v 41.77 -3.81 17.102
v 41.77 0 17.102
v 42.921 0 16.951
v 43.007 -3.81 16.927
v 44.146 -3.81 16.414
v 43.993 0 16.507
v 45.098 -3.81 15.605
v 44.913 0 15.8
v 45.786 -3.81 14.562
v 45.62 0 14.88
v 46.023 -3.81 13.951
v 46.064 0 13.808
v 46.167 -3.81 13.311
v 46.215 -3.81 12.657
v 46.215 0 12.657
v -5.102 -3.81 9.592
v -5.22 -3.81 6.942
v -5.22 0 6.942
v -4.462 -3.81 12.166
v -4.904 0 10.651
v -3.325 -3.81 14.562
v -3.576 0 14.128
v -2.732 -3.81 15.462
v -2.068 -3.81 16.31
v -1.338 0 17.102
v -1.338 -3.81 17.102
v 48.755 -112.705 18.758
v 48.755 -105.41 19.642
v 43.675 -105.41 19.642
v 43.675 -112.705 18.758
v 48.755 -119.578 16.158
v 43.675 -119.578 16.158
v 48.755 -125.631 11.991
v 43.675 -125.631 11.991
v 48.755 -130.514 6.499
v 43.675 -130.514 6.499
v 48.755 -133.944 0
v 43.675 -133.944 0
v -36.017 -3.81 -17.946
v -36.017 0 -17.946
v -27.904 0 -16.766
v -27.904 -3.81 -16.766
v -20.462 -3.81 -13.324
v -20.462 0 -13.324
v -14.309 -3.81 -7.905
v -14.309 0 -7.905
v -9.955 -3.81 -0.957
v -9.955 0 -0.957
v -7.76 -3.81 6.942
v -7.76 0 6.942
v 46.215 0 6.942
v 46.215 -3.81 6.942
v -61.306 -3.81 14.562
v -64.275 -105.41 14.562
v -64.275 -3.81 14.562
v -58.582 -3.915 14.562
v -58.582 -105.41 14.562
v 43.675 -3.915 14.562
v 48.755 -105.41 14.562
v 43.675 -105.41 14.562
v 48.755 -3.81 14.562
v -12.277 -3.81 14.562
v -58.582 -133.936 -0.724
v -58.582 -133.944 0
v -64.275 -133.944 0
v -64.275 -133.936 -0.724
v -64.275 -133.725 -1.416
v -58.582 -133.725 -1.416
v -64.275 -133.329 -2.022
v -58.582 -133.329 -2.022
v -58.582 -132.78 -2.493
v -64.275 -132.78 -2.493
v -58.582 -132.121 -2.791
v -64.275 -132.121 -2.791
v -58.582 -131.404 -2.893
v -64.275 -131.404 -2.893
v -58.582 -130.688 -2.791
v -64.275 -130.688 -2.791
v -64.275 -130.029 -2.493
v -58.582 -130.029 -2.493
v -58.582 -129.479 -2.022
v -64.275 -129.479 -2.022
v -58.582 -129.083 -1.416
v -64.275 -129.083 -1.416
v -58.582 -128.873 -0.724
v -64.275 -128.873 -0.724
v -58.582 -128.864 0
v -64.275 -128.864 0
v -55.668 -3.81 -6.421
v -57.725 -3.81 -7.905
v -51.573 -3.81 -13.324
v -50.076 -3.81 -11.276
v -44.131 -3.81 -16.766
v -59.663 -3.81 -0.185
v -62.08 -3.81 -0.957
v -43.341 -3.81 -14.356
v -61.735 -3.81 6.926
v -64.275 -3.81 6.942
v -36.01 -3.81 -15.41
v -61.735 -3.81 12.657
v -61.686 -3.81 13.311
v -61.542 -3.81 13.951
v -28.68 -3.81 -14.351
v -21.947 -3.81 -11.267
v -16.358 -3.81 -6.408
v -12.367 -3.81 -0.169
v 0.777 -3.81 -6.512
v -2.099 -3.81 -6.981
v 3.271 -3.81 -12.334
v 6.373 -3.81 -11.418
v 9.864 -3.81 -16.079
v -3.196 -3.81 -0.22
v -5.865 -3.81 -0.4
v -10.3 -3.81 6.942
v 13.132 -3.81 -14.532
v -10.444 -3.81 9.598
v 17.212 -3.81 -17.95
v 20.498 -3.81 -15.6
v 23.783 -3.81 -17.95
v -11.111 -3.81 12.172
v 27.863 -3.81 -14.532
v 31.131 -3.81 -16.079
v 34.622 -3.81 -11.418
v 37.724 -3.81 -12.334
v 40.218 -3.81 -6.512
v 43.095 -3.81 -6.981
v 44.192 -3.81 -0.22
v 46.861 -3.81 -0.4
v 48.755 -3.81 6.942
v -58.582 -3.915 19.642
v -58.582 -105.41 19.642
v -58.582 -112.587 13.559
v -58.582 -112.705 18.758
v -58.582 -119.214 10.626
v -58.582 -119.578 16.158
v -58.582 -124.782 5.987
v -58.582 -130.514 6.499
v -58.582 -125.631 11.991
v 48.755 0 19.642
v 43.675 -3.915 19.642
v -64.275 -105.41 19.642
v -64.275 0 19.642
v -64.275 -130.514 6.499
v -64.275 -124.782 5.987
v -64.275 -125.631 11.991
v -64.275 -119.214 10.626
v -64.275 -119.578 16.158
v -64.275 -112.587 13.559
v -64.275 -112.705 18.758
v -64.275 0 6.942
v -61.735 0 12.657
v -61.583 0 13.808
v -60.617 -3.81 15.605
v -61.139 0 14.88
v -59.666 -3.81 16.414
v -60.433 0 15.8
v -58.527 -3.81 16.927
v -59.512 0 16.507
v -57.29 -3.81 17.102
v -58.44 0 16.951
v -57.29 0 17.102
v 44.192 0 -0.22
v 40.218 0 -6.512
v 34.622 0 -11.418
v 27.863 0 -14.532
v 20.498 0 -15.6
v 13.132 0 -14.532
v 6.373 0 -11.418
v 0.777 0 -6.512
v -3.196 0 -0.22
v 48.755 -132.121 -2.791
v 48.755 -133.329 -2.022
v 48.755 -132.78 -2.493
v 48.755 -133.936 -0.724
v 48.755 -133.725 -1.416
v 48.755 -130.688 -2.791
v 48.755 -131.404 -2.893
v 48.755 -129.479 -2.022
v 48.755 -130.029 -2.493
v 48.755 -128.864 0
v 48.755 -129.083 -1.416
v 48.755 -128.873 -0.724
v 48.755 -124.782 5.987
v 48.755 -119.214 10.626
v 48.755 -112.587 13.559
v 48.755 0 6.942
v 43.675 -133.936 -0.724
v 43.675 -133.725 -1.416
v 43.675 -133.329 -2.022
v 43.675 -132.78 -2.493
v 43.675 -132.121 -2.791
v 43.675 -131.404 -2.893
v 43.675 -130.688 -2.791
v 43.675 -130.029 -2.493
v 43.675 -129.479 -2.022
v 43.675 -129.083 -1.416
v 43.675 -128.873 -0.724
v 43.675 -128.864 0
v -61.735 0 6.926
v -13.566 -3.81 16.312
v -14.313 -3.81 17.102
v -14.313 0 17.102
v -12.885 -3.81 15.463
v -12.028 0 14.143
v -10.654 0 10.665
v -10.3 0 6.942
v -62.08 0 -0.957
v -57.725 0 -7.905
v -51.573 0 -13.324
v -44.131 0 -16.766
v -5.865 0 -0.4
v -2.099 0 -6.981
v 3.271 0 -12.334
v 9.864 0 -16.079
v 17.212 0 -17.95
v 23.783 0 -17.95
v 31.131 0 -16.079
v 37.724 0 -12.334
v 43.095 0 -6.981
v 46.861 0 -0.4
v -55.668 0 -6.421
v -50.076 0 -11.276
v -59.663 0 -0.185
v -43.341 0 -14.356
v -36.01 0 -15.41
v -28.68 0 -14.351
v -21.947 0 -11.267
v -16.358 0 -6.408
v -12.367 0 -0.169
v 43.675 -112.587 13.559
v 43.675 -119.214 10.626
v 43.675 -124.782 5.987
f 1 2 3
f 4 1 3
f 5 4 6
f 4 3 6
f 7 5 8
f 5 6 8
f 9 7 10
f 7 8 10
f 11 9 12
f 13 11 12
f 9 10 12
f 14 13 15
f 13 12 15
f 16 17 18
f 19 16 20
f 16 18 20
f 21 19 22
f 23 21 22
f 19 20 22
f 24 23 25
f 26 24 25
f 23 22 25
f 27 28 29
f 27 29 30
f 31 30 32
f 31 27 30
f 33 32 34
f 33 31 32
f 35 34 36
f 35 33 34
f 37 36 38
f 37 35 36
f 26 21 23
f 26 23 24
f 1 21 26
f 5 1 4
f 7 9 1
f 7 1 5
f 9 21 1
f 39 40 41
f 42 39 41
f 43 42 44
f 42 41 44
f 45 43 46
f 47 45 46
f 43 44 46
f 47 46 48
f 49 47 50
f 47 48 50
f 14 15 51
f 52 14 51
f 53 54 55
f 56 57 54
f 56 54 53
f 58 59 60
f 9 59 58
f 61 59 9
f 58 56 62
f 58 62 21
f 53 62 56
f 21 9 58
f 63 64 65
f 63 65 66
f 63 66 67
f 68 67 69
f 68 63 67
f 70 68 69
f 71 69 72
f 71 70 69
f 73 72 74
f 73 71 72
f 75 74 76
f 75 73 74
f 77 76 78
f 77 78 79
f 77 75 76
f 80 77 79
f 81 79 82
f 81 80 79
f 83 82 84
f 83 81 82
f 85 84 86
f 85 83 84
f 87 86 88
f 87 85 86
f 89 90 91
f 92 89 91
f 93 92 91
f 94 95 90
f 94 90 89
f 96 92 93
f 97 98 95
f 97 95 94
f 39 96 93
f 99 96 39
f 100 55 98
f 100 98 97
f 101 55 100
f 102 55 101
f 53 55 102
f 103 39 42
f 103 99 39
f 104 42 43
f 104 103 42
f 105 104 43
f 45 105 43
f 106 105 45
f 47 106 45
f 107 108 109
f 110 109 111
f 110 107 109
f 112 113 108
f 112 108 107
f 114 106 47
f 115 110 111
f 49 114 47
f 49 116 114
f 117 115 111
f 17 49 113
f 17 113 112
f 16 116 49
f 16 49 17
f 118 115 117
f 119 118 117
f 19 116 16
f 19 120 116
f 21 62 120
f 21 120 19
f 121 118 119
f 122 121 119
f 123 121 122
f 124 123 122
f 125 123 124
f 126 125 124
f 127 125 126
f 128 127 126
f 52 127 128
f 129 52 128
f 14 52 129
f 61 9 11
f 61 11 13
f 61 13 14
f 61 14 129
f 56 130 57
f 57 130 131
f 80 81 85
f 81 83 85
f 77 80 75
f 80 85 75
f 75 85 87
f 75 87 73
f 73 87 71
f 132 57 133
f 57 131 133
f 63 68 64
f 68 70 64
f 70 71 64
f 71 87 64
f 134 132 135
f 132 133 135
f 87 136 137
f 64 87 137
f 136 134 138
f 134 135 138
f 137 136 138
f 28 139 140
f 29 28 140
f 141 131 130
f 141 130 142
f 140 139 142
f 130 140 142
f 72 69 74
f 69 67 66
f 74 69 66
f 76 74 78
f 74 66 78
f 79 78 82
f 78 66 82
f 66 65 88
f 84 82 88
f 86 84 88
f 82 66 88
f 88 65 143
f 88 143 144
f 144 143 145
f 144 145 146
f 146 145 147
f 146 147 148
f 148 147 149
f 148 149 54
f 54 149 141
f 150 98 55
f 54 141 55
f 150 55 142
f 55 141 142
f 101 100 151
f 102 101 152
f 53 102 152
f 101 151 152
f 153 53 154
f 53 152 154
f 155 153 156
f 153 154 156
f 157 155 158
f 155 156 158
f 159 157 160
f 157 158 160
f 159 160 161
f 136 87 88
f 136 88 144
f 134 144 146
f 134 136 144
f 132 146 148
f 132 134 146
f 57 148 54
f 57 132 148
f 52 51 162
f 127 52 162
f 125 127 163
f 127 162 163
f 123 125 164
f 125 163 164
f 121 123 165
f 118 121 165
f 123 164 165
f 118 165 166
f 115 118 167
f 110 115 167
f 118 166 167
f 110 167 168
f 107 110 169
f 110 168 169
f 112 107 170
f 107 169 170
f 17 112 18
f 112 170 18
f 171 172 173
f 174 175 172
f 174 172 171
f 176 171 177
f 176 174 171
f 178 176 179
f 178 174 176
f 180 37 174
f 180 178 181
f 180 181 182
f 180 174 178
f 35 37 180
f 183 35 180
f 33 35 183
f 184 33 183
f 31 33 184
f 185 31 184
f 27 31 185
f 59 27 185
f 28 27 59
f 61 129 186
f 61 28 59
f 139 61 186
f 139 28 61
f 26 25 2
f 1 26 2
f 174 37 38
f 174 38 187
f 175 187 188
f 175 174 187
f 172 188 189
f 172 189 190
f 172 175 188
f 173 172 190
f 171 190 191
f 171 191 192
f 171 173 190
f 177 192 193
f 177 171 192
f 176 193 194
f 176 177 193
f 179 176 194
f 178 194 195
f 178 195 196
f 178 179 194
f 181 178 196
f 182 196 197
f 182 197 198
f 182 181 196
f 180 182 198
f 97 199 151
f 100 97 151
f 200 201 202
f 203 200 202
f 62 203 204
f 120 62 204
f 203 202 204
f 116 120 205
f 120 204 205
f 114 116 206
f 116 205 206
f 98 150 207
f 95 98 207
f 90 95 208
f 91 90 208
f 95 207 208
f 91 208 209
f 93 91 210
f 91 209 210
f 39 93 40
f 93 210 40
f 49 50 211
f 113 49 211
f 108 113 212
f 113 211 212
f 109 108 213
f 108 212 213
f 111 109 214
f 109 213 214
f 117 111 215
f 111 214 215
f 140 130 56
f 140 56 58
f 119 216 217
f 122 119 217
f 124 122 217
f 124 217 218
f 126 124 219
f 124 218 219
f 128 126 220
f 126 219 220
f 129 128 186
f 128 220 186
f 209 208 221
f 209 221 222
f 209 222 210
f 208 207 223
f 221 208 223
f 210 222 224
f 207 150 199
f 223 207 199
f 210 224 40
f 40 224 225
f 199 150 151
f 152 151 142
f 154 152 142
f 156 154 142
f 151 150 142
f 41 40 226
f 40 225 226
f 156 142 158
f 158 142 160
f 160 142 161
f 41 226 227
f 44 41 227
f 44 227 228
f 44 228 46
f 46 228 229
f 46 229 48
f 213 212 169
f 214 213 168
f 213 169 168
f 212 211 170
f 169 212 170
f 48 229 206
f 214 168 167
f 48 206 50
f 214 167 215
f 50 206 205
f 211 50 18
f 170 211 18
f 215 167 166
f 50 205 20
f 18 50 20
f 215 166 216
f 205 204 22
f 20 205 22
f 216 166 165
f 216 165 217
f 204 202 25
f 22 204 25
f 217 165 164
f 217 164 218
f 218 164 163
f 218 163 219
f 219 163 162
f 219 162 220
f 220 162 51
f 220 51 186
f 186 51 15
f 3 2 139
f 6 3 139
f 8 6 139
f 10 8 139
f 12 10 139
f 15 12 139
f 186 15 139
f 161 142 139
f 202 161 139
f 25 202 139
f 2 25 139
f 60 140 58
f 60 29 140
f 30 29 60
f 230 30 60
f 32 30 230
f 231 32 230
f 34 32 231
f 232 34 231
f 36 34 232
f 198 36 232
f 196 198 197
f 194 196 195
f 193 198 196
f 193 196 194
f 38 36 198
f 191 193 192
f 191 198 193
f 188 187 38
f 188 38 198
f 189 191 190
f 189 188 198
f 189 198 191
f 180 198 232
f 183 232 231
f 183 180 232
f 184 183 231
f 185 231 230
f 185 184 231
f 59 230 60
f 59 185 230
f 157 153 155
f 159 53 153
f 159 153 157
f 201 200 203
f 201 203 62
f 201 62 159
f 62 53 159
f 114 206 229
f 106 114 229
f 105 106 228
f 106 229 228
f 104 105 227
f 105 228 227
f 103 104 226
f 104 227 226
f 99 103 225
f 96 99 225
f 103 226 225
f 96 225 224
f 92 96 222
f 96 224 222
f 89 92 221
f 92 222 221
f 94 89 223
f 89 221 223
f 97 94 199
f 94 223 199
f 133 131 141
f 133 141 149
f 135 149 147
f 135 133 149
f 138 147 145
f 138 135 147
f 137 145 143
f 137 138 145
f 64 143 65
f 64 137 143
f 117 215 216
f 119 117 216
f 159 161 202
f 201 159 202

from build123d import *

# Parameters (mm, degrees)
F1_DEPTH = 3.81
F3_DEPTH = 113.03
F4_W     = 102.2572831413
F4_H     = 63.9604873323
F4_H_2   = 99.7172831413
F5_DEPTH = 76.2
F6_DEPTH = 1.778


with BuildPart() as f1:
    # F0 (on Front) → F1 (new body)
    with BuildSketch(Plane.XZ):
        with BuildLine():
            Line((-61.7348178759, 19.6423271978), (-64.2748178759, 19.6423271978))
            Line((-64.2748178759, 19.6423271978), (-64.2748178759, 17.1023271978))
            Line((-64.2748178759, 17.1023271978), (-64.2748178759, 6.9423271978))
            ThreePointArc((-64.2748178759, 6.9423271978), (-54.844956833, -10.8368491458), (-36.0173178759, -17.9460967888))
            ThreePointArc((-36.0173178759, -17.9460967888), (-17.1896789189, -10.8368491458), (-7.7598178759, 6.9423271978))
            ThreePointArc((-7.7598178759, 6.9423271978), (0.406829165, -9.8369400067), (17.212230035, -17.9496728022))
            Line((17.212230035, -17.9496728022), (20.4976821241, -17.9496728022))
            Line((20.4976821241, -17.9496728022), (23.7831342132, -17.9496728022))
            ThreePointArc((23.7831342132, -17.9496728022), (40.5885350832, -9.8369400067), (48.7551821241, 6.9423271978))
            Line((48.7551821241, 6.9423271978), (48.7551821241, 17.1023271978))
            Line((48.7551821241, 17.1023271978), (48.7551821241, 19.6423271978))
            Line((48.7551821241, 19.6423271978), (46.2151821241, 19.6423271978))
            Line((46.2151821241, 19.6423271978), (-61.7348178759, 19.6423271978))
        make_face()
        with BuildLine():
            ThreePointArc((46.2151821241, 6.9423271978), (20.4976821241, -15.5999571068), (-5.2198178759, 6.9423271978))
            ThreePointArc((-5.2198178759, 6.9423271978), (-4.3618373454, 12.4360262368), (-1.3381814351, 17.1023271978))
            Line((-1.3381814351, 17.1023271978), (41.7701821241, 17.1023271978))
            ThreePointArc((41.7701821241, 17.1023271978), (44.9132717665, 15.8004168402), (46.2151821241, 12.6573271978))
            Line((46.2151821241, 12.6573271978), (46.2151821241, 6.9423271978))
        make_face(mode=Mode.SUBTRACT)
        with BuildLine():
            ThreePointArc((-14.3130178759, 17.1023271978), (-11.2183816966, 12.4521014886), (-10.2998178759, 6.9423271978))
            ThreePointArc((-10.2998178759, 6.9423271978), (-36.010114835, -15.409671479), (-61.7348178759, 6.9257458672))
            Line((-61.7348178759, 6.9257458672), (-61.7348178759, 12.6573271978))
            ThreePointArc((-61.7348178759, 12.6573271978), (-60.4329075183, 15.8004168402), (-57.2898178759, 17.1023271978))
            Line((-57.2898178759, 17.1023271978), (-14.3130178759, 17.1023271978))
        make_face(mode=Mode.SUBTRACT)
    extrude(amount=F1_DEPTH)

    # F2 (on face) → F3 (join)
    with BuildSketch(Plane.YZ.offset(48.7551821241)):
        with BuildLine():
            Line((-3.81, 14.5623271978), (-3.81, 19.6423271978))
            Line((-3.81, 19.6423271978), (-105.41, 19.6423271978))
            ThreePointArc((-105.41, 19.6423271978), (-122.7306756991, 14.2570441707), (-133.9442287254, 0))
            ThreePointArc((-133.9442287254, 0), (-131.4042287254, -2.8934895881), (-128.8642287254, 0))
            ThreePointArc((-128.8642287254, 0), (-119.2136428029, 10.6256409156), (-105.41, 14.5623271978))
            Line((-105.41, 14.5623271978), (-3.81, 14.5623271978))
        make_face()
    extrude(amount=-F3_DEPTH)

    # F4 (on face) → F5 (cut)
    with BuildSketch(Plane.XY.offset(19.6423271978)):
        with Locations((-7.4534594466, -137.3902436662)):
            Rectangle(F4_W, F4_H)
        with Locations((-7.4534594466, -55.5513584293)):
            Rectangle(F4_W, F4_H_2)
    extrude(amount=-F5_DEPTH, mode=Mode.SUBTRACT)

    # F6 (cut): a face of the model
    f6_faces = [f1.faces().sort_by_distance(p)[0] for p in [
        (-7.4534594466, -5.6927168587, 17.1023271978),
    ]]
    extrude(f6_faces, amount=-F6_DEPTH, mode=Mode.SUBTRACT)


solid = f1.part
